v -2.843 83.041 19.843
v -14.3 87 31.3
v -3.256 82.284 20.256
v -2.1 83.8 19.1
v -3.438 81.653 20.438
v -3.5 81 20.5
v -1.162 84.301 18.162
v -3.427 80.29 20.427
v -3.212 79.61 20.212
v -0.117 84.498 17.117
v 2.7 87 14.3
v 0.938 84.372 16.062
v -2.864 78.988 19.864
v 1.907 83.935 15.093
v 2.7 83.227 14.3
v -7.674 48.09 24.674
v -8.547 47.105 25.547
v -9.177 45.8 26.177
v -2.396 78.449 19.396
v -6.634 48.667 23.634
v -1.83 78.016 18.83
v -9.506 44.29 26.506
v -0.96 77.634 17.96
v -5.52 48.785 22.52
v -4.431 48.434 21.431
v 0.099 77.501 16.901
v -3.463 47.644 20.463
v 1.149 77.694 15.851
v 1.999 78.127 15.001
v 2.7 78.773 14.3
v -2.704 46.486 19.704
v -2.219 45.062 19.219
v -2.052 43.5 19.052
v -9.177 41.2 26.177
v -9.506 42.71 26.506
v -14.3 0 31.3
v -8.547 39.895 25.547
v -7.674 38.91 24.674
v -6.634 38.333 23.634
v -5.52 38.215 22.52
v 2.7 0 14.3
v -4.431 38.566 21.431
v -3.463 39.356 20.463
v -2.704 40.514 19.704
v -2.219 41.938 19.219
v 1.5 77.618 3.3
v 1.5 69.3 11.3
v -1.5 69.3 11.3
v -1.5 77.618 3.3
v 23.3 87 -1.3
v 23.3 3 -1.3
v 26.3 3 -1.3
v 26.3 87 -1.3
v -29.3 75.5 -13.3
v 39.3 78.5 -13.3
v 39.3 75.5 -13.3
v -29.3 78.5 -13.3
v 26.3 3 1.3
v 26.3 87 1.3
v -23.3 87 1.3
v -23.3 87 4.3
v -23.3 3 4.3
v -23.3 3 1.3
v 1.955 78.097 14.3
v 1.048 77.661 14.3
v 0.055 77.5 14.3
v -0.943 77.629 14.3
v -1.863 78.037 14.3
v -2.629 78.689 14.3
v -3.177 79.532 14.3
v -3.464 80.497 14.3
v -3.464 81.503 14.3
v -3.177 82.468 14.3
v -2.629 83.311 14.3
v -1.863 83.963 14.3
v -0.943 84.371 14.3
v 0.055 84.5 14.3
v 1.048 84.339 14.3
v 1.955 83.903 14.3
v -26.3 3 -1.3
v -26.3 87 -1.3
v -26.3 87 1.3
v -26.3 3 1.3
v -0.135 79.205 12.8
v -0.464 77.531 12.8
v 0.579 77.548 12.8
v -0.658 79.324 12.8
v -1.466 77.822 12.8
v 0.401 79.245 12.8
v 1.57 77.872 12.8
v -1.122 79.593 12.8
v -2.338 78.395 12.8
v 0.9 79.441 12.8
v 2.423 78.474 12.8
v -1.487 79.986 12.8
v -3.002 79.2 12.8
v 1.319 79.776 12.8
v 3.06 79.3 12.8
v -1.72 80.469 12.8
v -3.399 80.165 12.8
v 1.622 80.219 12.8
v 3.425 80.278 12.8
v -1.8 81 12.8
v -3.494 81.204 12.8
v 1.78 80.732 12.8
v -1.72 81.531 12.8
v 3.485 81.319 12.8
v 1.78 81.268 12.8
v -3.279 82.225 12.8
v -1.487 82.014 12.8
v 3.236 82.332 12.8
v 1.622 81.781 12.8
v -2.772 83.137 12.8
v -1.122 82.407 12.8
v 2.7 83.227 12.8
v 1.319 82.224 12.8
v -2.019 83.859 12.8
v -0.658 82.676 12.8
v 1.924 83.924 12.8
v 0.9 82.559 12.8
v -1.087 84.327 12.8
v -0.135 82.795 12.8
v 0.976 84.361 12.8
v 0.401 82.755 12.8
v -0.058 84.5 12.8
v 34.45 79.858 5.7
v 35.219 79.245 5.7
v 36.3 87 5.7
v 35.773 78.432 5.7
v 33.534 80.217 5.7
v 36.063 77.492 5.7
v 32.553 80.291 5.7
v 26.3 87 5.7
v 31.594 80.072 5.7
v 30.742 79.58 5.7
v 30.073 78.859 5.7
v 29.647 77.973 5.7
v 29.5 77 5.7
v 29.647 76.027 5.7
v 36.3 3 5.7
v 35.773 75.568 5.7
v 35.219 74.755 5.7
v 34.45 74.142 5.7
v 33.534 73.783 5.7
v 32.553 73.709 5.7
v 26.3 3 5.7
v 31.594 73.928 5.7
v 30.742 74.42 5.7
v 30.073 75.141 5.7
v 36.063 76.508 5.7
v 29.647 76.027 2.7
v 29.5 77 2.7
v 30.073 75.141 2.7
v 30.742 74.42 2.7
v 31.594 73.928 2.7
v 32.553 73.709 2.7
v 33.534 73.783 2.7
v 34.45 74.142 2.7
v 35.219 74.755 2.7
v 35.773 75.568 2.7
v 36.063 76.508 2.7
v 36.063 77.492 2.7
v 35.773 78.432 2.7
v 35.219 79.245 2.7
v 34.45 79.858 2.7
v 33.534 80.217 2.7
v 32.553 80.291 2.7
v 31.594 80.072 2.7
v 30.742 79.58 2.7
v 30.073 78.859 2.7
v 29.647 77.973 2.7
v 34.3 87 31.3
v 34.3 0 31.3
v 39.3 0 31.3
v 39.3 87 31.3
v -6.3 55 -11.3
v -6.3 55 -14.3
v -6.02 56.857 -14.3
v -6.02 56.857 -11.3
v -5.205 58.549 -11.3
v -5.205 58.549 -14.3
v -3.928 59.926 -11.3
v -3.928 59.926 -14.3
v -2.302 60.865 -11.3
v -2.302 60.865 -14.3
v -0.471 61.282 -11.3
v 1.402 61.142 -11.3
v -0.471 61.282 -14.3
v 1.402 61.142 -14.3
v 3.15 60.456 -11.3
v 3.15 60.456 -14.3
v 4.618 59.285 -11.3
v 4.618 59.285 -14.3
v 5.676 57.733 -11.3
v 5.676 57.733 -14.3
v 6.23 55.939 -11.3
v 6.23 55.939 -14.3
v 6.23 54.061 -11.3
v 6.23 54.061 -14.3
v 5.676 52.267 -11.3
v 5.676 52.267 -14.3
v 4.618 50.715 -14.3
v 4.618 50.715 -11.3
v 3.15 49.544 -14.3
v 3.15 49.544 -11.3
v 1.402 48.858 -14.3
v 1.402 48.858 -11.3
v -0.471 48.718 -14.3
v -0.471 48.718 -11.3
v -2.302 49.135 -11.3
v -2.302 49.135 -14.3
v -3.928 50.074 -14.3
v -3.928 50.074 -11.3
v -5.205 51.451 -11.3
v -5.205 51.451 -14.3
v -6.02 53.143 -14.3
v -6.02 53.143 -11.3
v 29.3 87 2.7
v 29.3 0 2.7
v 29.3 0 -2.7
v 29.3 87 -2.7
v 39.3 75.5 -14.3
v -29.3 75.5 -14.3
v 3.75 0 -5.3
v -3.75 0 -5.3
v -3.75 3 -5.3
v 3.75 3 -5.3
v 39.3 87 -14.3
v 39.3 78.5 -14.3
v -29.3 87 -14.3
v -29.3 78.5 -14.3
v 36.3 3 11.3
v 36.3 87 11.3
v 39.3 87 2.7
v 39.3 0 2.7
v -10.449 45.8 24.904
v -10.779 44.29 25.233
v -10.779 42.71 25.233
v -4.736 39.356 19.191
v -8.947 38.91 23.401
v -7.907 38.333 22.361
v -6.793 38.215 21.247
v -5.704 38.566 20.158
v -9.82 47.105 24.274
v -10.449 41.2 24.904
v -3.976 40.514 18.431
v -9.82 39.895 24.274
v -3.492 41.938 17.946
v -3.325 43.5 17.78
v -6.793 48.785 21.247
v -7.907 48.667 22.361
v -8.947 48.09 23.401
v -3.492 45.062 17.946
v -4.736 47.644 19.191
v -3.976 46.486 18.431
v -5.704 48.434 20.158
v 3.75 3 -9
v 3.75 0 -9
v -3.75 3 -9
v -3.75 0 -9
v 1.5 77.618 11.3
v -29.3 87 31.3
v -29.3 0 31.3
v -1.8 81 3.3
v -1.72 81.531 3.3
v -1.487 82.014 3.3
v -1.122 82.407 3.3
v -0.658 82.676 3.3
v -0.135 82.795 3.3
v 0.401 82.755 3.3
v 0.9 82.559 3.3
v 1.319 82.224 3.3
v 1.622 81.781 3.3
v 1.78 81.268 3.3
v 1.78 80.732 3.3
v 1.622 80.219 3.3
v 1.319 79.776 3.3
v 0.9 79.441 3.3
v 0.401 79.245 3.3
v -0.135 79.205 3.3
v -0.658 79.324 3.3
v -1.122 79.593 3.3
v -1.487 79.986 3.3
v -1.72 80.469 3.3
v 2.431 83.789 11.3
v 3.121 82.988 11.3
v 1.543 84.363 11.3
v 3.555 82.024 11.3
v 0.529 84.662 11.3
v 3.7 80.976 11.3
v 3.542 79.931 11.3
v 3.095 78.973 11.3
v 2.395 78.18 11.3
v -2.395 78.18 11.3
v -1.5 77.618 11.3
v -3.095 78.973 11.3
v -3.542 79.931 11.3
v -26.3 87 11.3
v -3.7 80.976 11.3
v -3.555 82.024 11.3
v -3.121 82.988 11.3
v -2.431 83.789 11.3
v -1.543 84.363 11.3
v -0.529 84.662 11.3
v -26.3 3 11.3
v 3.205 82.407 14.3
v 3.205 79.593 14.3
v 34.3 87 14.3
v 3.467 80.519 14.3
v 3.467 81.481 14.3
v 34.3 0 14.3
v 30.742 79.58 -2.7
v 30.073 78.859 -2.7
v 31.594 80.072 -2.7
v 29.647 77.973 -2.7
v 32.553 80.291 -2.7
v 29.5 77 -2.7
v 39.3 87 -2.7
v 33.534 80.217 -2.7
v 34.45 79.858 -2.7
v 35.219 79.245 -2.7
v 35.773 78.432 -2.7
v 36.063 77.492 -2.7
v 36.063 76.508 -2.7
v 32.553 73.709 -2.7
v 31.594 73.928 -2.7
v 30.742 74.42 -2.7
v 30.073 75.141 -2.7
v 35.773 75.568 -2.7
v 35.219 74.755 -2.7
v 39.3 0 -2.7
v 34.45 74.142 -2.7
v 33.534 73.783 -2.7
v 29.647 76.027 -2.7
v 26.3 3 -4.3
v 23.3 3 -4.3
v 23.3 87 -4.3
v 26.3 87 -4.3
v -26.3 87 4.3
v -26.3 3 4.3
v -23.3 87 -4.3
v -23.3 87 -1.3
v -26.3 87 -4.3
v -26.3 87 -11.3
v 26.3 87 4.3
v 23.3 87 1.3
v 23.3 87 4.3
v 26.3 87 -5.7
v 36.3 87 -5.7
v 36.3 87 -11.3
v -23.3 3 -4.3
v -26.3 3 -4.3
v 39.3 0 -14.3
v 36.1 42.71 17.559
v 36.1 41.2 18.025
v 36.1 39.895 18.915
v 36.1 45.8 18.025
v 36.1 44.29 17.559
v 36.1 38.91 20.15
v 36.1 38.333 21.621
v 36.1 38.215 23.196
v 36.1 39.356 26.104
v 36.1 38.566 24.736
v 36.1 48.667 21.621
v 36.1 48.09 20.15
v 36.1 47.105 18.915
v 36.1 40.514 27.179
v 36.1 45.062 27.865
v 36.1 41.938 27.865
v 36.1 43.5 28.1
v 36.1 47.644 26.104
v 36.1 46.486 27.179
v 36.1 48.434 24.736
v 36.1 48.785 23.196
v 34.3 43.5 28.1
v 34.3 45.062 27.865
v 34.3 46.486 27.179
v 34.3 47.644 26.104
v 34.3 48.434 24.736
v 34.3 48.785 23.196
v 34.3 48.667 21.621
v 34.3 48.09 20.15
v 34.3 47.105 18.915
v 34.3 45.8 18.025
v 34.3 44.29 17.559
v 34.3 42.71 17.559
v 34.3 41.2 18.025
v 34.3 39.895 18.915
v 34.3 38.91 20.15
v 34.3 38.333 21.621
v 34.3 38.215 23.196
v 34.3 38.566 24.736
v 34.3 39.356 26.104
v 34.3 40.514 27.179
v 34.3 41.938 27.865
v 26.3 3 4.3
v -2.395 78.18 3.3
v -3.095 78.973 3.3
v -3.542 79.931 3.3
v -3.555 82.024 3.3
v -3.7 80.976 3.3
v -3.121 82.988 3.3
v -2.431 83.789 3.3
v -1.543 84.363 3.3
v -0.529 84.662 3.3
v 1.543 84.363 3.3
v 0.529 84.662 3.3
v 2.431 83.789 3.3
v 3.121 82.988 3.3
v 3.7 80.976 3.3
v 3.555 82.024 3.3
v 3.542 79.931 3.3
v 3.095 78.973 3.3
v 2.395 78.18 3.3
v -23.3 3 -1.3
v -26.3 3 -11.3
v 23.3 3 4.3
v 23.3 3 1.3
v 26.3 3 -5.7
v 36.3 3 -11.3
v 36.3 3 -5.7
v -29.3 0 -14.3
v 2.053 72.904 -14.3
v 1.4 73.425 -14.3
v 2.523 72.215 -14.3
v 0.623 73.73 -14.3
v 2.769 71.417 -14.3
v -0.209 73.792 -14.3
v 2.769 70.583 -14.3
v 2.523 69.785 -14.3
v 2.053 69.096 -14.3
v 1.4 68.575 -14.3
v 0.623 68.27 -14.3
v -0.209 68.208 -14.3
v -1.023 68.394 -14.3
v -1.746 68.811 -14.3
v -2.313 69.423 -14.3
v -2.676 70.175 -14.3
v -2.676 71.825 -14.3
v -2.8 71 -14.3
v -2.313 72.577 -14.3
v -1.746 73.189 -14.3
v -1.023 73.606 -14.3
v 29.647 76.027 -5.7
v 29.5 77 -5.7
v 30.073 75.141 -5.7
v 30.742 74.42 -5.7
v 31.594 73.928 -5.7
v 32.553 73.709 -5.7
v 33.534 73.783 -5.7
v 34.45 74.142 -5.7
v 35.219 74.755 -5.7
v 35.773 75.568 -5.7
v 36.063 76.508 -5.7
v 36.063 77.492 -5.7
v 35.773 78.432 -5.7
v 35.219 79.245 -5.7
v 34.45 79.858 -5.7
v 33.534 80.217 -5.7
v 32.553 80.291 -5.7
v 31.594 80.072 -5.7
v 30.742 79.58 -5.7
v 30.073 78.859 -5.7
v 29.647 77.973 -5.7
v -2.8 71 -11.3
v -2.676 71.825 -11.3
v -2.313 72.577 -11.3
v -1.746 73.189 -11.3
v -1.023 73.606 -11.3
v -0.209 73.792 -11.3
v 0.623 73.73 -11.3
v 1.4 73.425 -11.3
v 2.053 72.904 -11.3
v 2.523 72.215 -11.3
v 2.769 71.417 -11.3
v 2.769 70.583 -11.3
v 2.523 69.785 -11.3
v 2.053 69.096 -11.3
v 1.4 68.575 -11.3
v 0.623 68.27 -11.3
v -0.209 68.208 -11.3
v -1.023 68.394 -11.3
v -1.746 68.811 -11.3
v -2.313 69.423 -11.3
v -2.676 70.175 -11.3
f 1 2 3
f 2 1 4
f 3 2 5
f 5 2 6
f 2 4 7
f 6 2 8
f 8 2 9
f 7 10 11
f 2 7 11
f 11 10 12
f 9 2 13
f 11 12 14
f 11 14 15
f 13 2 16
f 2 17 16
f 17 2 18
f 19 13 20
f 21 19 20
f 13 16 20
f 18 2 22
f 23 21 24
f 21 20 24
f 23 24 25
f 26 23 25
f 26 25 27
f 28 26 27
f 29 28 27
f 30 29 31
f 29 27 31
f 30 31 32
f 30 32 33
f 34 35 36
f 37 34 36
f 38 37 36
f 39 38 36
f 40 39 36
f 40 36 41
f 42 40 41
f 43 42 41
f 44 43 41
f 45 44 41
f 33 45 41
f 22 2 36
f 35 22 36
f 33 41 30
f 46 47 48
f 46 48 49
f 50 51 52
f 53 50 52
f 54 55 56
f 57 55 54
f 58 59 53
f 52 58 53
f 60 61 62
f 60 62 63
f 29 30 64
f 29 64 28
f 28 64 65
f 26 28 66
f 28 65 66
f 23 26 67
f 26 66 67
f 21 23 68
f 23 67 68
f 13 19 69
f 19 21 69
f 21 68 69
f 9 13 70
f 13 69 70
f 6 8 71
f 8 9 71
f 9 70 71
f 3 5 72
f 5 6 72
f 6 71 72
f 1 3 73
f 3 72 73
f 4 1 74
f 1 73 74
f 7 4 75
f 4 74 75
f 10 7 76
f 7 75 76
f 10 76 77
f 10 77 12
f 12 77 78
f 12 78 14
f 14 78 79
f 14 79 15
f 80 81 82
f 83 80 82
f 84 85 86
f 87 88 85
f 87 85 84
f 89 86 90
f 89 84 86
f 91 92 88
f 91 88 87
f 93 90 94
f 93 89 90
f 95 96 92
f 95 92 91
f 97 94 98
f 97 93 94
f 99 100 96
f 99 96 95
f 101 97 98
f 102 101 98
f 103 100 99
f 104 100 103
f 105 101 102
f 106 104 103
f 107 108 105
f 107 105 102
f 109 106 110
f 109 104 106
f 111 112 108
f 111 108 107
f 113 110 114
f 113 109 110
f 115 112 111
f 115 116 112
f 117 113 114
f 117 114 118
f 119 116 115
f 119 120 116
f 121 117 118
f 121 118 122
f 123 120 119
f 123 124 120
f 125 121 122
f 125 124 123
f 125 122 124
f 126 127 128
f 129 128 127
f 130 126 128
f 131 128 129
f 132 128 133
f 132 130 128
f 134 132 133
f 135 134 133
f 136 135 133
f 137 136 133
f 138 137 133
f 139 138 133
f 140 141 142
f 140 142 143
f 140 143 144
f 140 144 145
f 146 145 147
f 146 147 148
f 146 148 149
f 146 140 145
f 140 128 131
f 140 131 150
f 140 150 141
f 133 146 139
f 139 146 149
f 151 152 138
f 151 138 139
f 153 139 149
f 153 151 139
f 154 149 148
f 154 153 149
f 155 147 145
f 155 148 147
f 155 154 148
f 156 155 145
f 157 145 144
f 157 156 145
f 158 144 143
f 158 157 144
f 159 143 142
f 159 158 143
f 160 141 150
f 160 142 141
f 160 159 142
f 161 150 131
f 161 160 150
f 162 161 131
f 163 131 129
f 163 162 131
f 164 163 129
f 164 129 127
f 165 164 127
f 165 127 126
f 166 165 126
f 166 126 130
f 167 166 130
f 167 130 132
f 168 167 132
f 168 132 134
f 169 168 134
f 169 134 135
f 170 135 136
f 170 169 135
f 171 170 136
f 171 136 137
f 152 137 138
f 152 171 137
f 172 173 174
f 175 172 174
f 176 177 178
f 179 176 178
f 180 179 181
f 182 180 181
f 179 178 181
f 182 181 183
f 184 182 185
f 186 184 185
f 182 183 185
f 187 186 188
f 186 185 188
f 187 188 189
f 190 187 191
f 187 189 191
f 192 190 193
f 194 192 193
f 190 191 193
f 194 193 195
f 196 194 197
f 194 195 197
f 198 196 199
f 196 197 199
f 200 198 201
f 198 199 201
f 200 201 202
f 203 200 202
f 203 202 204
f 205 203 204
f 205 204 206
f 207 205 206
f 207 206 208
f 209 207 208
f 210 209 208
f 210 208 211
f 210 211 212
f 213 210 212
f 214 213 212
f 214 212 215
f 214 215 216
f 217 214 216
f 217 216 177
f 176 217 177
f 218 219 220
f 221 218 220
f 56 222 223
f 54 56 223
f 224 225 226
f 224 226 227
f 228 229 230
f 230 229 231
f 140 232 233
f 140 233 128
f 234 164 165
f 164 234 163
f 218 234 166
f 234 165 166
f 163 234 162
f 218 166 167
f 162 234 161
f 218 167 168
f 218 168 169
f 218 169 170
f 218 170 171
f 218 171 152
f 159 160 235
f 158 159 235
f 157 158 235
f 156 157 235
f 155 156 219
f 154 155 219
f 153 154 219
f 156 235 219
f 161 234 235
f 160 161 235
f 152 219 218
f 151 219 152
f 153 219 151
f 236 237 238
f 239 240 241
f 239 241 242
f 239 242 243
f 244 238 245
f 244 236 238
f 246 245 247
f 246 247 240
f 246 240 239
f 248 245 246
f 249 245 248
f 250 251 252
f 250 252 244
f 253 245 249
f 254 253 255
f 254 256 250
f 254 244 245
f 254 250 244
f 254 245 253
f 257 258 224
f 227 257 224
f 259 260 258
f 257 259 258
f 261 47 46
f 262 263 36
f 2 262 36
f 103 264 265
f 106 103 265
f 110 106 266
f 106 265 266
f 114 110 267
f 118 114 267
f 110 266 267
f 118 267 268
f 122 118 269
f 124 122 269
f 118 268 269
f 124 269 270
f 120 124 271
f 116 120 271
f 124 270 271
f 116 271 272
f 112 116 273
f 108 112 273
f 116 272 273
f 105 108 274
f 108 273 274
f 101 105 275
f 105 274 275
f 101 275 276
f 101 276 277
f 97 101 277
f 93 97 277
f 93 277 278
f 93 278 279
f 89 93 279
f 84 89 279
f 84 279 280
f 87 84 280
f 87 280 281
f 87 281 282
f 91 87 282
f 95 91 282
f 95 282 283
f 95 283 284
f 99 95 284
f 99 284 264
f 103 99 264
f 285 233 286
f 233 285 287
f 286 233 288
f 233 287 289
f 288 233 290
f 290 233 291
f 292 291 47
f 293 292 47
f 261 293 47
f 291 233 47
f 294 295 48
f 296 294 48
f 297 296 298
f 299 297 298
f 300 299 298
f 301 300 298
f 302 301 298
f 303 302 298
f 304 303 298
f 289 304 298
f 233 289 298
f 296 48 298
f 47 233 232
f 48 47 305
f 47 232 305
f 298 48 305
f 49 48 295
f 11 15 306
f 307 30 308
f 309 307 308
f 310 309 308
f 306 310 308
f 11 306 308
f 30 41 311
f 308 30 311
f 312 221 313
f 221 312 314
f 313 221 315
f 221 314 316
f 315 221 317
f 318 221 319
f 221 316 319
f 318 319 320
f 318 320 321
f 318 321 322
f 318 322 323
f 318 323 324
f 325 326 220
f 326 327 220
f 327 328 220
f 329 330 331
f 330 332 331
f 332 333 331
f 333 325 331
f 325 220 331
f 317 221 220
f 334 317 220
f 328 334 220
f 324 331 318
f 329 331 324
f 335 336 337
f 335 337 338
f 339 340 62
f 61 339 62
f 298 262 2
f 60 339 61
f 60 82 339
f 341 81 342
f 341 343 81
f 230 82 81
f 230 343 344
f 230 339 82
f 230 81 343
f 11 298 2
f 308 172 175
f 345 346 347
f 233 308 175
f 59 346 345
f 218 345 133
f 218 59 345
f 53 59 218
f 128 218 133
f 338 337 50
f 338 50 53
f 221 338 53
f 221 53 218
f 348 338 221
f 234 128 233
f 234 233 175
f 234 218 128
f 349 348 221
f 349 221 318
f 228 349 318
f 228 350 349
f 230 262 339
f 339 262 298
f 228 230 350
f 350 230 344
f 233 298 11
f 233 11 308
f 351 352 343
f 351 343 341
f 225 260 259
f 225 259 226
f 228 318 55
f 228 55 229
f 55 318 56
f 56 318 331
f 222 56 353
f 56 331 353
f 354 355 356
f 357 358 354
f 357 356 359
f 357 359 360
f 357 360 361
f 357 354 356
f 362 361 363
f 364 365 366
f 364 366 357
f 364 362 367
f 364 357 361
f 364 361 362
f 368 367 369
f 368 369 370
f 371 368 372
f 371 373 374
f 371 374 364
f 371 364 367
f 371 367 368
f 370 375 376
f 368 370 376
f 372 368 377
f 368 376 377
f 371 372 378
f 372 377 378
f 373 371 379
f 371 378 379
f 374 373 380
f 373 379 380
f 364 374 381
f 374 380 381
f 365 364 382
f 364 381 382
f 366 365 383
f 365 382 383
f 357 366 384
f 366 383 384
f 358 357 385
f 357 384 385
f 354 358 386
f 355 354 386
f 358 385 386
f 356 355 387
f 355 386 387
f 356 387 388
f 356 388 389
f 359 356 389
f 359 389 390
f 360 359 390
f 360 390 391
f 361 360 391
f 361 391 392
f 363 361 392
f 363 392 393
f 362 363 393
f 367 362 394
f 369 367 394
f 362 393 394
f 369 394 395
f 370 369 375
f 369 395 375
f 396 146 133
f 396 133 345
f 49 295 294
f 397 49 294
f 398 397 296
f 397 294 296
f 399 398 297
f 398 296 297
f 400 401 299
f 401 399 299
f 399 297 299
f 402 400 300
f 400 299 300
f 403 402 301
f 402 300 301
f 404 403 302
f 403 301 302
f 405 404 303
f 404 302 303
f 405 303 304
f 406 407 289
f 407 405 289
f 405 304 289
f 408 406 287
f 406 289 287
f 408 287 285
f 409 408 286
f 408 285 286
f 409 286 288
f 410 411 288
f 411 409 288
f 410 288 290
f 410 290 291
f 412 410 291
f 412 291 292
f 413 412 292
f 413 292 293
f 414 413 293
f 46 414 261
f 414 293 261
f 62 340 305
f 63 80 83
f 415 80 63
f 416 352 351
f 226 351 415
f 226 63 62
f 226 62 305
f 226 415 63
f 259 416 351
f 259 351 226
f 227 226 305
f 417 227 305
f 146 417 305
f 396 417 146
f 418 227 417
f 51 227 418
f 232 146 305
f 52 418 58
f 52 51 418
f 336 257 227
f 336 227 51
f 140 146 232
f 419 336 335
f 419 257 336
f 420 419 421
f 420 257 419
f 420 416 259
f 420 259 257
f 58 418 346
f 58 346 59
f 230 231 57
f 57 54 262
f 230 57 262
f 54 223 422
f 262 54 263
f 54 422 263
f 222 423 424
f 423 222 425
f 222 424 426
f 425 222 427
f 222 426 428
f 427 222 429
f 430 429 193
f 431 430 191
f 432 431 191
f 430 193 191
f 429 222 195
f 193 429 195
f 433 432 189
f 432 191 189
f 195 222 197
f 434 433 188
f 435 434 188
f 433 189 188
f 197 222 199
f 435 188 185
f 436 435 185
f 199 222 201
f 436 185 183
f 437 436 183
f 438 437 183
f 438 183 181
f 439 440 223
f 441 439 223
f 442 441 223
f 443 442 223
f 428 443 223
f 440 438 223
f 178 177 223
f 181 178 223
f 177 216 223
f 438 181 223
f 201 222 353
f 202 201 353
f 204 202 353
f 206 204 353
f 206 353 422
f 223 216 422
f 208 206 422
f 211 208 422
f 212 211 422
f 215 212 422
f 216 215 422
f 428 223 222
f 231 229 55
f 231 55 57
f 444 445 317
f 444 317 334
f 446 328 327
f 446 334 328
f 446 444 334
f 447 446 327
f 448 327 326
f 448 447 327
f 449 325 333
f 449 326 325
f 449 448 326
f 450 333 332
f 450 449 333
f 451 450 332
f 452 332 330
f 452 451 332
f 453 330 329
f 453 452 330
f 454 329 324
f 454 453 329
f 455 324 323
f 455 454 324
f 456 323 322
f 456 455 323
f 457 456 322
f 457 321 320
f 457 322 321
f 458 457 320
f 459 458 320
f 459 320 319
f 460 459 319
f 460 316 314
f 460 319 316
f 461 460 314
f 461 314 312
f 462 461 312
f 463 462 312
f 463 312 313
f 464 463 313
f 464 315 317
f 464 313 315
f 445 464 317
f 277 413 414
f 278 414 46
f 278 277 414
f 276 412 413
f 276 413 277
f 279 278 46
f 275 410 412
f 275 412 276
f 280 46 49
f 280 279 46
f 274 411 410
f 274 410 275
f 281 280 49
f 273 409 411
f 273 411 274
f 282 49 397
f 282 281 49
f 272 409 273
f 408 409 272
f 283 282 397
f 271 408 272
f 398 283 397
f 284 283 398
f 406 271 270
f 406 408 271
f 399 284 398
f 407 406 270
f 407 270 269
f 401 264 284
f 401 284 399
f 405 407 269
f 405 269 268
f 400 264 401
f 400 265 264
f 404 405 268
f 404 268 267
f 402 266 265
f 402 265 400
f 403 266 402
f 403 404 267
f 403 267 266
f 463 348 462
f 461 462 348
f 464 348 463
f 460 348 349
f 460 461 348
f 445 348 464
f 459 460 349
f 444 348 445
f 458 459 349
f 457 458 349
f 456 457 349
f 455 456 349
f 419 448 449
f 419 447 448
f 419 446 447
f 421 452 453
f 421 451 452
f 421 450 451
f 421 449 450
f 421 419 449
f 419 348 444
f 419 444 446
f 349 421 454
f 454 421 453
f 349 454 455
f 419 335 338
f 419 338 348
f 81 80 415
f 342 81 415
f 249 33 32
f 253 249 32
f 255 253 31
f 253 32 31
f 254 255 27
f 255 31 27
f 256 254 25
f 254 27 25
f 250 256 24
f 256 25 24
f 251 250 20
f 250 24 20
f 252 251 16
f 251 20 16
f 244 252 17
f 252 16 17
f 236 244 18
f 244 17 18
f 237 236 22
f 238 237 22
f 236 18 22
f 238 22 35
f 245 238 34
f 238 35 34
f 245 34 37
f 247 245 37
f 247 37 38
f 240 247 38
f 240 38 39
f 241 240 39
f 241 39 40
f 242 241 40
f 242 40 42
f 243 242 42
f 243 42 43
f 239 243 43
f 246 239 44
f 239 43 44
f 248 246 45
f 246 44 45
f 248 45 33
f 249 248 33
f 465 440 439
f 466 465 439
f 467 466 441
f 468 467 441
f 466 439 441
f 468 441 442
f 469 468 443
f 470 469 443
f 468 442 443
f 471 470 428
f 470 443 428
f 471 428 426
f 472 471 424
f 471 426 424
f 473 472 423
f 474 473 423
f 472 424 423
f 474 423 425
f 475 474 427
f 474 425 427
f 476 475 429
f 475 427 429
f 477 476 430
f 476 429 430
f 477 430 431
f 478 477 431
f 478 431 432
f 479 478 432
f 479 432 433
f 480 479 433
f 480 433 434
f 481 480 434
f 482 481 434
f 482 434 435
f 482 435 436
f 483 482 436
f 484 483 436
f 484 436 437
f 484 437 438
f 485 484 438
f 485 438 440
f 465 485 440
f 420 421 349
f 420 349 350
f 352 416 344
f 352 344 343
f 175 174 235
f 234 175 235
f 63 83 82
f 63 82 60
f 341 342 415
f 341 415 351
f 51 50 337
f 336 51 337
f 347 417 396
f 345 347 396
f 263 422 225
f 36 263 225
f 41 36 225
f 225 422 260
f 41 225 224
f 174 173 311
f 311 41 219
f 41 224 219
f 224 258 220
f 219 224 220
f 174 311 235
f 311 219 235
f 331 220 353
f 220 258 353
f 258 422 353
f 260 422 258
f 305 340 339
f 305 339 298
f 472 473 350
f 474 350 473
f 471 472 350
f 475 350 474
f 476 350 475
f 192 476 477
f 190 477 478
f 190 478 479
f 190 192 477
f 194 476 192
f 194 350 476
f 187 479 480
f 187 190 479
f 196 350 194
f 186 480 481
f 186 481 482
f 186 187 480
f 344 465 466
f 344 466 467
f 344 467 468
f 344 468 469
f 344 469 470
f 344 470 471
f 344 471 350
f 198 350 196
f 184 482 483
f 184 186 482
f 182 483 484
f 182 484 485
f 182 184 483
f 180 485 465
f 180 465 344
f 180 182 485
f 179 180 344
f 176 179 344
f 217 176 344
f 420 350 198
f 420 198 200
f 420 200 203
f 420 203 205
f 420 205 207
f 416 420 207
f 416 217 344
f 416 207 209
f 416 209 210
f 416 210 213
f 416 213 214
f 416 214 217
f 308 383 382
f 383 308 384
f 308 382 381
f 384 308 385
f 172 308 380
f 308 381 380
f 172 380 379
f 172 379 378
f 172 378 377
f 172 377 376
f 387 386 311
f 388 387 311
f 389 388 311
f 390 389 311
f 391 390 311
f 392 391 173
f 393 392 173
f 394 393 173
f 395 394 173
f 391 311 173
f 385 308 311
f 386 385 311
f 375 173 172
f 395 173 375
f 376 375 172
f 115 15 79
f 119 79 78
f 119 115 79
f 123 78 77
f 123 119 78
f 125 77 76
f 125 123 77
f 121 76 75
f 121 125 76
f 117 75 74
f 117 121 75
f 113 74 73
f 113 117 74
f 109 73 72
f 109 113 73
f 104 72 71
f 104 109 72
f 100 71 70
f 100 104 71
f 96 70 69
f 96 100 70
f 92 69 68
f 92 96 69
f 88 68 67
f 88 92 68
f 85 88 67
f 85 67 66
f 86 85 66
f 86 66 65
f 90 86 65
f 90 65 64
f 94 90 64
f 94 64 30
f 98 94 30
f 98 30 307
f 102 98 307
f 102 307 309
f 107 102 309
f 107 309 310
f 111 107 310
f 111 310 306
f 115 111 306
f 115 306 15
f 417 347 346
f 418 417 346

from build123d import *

# Parameters (mm, degrees)
BOSS_EXTRUDE2_DEPTH = 87
SHELL2_T            = -3
SKETCH3_W           = 3
SKETCH3_H           = 3
BOSS_EXTRUDE3_DEPTH = 84
CUT_EXTRUDE1_REACH  = 106.538
SKETCH4_R           = 3.3
CUT_EXTRUDE2_REACH  = 107.796
SKETCH5_R           = 6.3
SKETCH5_R_2         = 2.8
BOSS_EXTRUDE4_DEPTH = 84
CUT_EXTRUDE3_REACH  = 102.465
SKETCH7_W           = 7.5
SKETCH7_H           = 3.7
SKETCH8_R           = 3.7
BOSS_EXTRUDE5_DEPTH = 8
SKETCH9_R           = 1.8
CUT_EXTRUDE4_DEPTH  = 11
SKETCH10_R          = 5.3
CUT_EXTRUDE5_DEPTH  = 1.8
SKETCH11_R          = 5.3
CUT_EXTRUDE6_DEPTH  = 1.8
CUT_EXTRUDE7_REACH  = 101.657
SKETCH15_R          = 3.5
CUT_EXTRUDE8_START  = -1.5
SKETCH17_R          = 3.5
CUT_EXTRUDE8_DEPTH  = 1.5
SKETCH18_W          = 68.6
SKETCH18_H          = 3
CUT_EXTRUDE9_DEPTH  = 1
SKETCH31_W          = 3
SKETCH31_H          = 8.317693095
BOSS_EXTRUDE6_DEPTH = 8
CUT_EXTRUDE10_DEPTH = 3


with BuildPart() as part:
    # Sketch1 → Boss-Extrude2 (new body)
    with BuildSketch(Plane(origin=(0, 0, 0), x_dir=(1, 0, 0), z_dir=(0, 1, 0))):
        Polygon((-29.3, 14.3), (-29.3, -31.3), (-14.3, -31.3), (2.7, -14.3), (34.3, -14.3), (34.3, -31.3), (39.3, -31.3), (39.3, -2.7), (29.3, -2.7), (29.3, 2.7), (39.3, 2.7), (39.3, 14.3), align=None)
    extrude(amount=BOSS_EXTRUDE2_DEPTH)

    # Shell2
    shell2_openings = [part.faces().sort_by_distance(p)[0] for p in [
        (1.788570481, 87, 4.446127974),
    ]]
    offset(amount=SHELL2_T, openings=shell2_openings, kind=Kind.INTERSECTION)

    # Sketch3 → Boss-Extrude3 (add)
    with BuildSketch(Plane(origin=(0, 3, 0), x_dir=(1, 0, 0), z_dir=(0, 1, 0))):
        with Locations((24.8, 2.8)):
            Rectangle(SKETCH3_W, SKETCH3_H)
        with Locations((24.8, -2.8)):
            Rectangle(SKETCH3_W, SKETCH3_H)
        with Locations((-24.8, -2.8)):
            Rectangle(SKETCH3_W, SKETCH3_H)
        with Locations((-24.8, 2.8)):
            Rectangle(SKETCH3_W, SKETCH3_H)
    extrude(amount=BOSS_EXTRUDE3_DEPTH)

    # Cut-Extrude1: up to this face of the body (flat: up to its plane)
    cut_extrude1_end = Plane(part.part.faces().sort_by_distance((31.3, 45, 5.7))[0])
    # Sketch4 → Cut-Extrude1 (cut, up to the picked face)
    with BuildSketch(Plane.XY.offset(-11.3), mode=Mode.PRIVATE) as cut_extrude1_sk1:
        with Locations(Location((32.8, 77, 0), (0, 0, 180))):
            Circle(SKETCH4_R)
    cut_extrude1_tool1 = split(extrude(cut_extrude1_sk1.sketch, amount=CUT_EXTRUDE1_REACH, mode=Mode.PRIVATE), bisect_by=cut_extrude1_end, keep=Keep.BOTH, mode=Mode.PRIVATE)
    add(cut_extrude1_tool1.solids().sort_by(Axis((32.8, 77, -11.3), (0, 0, 1)))[0], mode=Mode.SUBTRACT)

    # Sketch5 → Cut-Extrude2 (cut, up to next)
    with BuildSketch(Plane(origin=(0, 0, -14.3), x_dir=(-1, 0, 0), z_dir=(0, 0, -1)), mode=Mode.PRIVATE) as cut_extrude2_sk1:
        with Locations((0, 55)):
            Circle(SKETCH5_R)
    cut_extrude2_tool1 = extrude(cut_extrude2_sk1.sketch, amount=-CUT_EXTRUDE2_REACH, mode=Mode.PRIVATE) & part.part
    # Sketch5 → Cut-Extrude2 (cut, up to next)
    with BuildSketch(Plane(origin=(0, 0, -14.3), x_dir=(-1, 0, 0), z_dir=(0, 0, -1)), mode=Mode.PRIVATE) as cut_extrude2_sk2:
        with Locations((0, 71)):
            Circle(SKETCH5_R_2)
    cut_extrude2_tool2 = extrude(cut_extrude2_sk2.sketch, amount=-CUT_EXTRUDE2_REACH, mode=Mode.PRIVATE) & part.part
    add(cut_extrude2_tool1.solids().sort_by_distance((0, 55, -14.3))[0], mode=Mode.SUBTRACT)
    add(cut_extrude2_tool2.solids().sort_by_distance((0, 71, -14.3))[0], mode=Mode.SUBTRACT)

    # Sketch6 → Boss-Extrude4 (add)
    with BuildSketch(Plane(origin=(0, 3, 0), x_dir=(1, 0, 0), z_dir=(0, 1, 0))):
        Polygon((1.457359313, -11.3), (-26.3, -11.3), (-26.3, -28.3), (-15.542640687, -28.3), align=None)
    extrude(amount=BOSS_EXTRUDE4_DEPTH)

    # Sketch7 → Cut-Extrude3 (cut, up to next)
    with BuildSketch(Plane.XZ, mode=Mode.PRIVATE) as cut_extrude3_sk1:
        with Locations((0, -7.15)):
            Rectangle(SKETCH7_W, SKETCH7_H)
    cut_extrude3_tool1 = extrude(cut_extrude3_sk1.sketch, amount=-CUT_EXTRUDE3_REACH, mode=Mode.PRIVATE) & part.part
    add(cut_extrude3_tool1.solids().sort_by_distance((0, 0, -7.15))[0], mode=Mode.SUBTRACT)

    # Sketch8 → Boss-Extrude5 (add)
    with BuildSketch(Plane(origin=(0, 0, 11.3), x_dir=(-1, 0, 0), z_dir=(0, 0, -1))):
        with Locations((0, 81)):
            Circle(SKETCH8_R)
    extrude(amount=BOSS_EXTRUDE5_DEPTH)

    # Sketch9 → Cut-Extrude4 (cut)
    with BuildSketch(Plane(origin=(0, 0, 3.3), x_dir=(-1, 0, 0), z_dir=(0, 0, -1))):
        with Locations((0, 81)):
            Circle(SKETCH9_R)
    extrude(amount=-CUT_EXTRUDE4_DEPTH, mode=Mode.SUBTRACT)

    # Sketch10 → Cut-Extrude5 (cut)
    with BuildSketch(Plane(origin=(8.5, 0, 8.5), x_dir=(0.7071067811865475, 0, -0.7071067811865476), z_dir=(0.7071067811865476, 0, 0.7071067811865475))):
        with Locations((-20.223253942, 43.5)):
            Circle(SKETCH10_R)
    extrude(amount=-CUT_EXTRUDE5_DEPTH, mode=Mode.SUBTRACT)

    # Sketch11 → Cut-Extrude6 (cut)
    with BuildSketch(Plane.ZY.offset(-34.3)):
        with Locations((22.8, 43.5)):
            Circle(SKETCH11_R)
    extrude(amount=-CUT_EXTRUDE6_DEPTH, mode=Mode.SUBTRACT)

    # Cut-Extrude7: up to this face of the body (flat: up to its plane)
    cut_extrude7_end = Plane(part.part.faces().sort_by_distance((-13.661760233, 43.5, 30.661760233))[0])
    # Sketch15 → Cut-Extrude7 (cut, up to the picked face)
    with BuildSketch(Plane(origin=(0, 0, 14.3), x_dir=(-1, 0, 0), z_dir=(0, 0, -1)), mode=Mode.PRIVATE) as cut_extrude7_sk1:
        with Locations((0, 81)):
            Circle(SKETCH15_R)
    cut_extrude7_tool1 = split(extrude(cut_extrude7_sk1.sketch, amount=-CUT_EXTRUDE7_REACH, mode=Mode.PRIVATE), bisect_by=cut_extrude7_end, keep=Keep.BOTH, mode=Mode.PRIVATE)
    add(cut_extrude7_tool1.solids().sort_by(Axis((0, 81, 14.3), (0, 0, 1)))[0], mode=Mode.SUBTRACT)

    # Sketch17 → Cut-Extrude8 (cut)
    with BuildSketch(Plane.XY.offset(14.3).offset(CUT_EXTRUDE8_START)):
        with Locations(Location((0, 81, 0), (0, 0, 39.517652797))):
            Circle(SKETCH17_R)
    extrude(amount=CUT_EXTRUDE8_DEPTH, mode=Mode.SUBTRACT)

    # Sketch18 → Cut-Extrude9 (cut)
    with BuildSketch(Plane(origin=(0, 0, -14.3), x_dir=(-1, 0, 0), z_dir=(0, 0, -1))):
        with Locations((-5, 77)):
            Rectangle(SKETCH18_W, SKETCH18_H)
    extrude(amount=-CUT_EXTRUDE9_DEPTH, mode=Mode.SUBTRACT)

    # Sketch31 → Boss-Extrude6 (add)
    with BuildSketch(Plane(origin=(0, 0, 11.3), x_dir=(-1, 0, 0), z_dir=(0, 0, -1))):
        with Locations((0, 73.458846548)):
            Rectangle(SKETCH31_W, SKETCH31_H)
    extrude(amount=BOSS_EXTRUDE6_DEPTH)

    # Sketch32 → Cut-Extrude10 (cut)
    with BuildSketch(Plane(origin=(1.5, 0, 0), x_dir=(0, 0, -1), z_dir=(1, 0, 0))):
        Polygon((-11.3, 69.3), (-3.3, 77.617693095), (-3.3, 69.3), align=None)
    extrude(amount=-CUT_EXTRUDE10_DEPTH, mode=Mode.SUBTRACT)


solid = part.part
